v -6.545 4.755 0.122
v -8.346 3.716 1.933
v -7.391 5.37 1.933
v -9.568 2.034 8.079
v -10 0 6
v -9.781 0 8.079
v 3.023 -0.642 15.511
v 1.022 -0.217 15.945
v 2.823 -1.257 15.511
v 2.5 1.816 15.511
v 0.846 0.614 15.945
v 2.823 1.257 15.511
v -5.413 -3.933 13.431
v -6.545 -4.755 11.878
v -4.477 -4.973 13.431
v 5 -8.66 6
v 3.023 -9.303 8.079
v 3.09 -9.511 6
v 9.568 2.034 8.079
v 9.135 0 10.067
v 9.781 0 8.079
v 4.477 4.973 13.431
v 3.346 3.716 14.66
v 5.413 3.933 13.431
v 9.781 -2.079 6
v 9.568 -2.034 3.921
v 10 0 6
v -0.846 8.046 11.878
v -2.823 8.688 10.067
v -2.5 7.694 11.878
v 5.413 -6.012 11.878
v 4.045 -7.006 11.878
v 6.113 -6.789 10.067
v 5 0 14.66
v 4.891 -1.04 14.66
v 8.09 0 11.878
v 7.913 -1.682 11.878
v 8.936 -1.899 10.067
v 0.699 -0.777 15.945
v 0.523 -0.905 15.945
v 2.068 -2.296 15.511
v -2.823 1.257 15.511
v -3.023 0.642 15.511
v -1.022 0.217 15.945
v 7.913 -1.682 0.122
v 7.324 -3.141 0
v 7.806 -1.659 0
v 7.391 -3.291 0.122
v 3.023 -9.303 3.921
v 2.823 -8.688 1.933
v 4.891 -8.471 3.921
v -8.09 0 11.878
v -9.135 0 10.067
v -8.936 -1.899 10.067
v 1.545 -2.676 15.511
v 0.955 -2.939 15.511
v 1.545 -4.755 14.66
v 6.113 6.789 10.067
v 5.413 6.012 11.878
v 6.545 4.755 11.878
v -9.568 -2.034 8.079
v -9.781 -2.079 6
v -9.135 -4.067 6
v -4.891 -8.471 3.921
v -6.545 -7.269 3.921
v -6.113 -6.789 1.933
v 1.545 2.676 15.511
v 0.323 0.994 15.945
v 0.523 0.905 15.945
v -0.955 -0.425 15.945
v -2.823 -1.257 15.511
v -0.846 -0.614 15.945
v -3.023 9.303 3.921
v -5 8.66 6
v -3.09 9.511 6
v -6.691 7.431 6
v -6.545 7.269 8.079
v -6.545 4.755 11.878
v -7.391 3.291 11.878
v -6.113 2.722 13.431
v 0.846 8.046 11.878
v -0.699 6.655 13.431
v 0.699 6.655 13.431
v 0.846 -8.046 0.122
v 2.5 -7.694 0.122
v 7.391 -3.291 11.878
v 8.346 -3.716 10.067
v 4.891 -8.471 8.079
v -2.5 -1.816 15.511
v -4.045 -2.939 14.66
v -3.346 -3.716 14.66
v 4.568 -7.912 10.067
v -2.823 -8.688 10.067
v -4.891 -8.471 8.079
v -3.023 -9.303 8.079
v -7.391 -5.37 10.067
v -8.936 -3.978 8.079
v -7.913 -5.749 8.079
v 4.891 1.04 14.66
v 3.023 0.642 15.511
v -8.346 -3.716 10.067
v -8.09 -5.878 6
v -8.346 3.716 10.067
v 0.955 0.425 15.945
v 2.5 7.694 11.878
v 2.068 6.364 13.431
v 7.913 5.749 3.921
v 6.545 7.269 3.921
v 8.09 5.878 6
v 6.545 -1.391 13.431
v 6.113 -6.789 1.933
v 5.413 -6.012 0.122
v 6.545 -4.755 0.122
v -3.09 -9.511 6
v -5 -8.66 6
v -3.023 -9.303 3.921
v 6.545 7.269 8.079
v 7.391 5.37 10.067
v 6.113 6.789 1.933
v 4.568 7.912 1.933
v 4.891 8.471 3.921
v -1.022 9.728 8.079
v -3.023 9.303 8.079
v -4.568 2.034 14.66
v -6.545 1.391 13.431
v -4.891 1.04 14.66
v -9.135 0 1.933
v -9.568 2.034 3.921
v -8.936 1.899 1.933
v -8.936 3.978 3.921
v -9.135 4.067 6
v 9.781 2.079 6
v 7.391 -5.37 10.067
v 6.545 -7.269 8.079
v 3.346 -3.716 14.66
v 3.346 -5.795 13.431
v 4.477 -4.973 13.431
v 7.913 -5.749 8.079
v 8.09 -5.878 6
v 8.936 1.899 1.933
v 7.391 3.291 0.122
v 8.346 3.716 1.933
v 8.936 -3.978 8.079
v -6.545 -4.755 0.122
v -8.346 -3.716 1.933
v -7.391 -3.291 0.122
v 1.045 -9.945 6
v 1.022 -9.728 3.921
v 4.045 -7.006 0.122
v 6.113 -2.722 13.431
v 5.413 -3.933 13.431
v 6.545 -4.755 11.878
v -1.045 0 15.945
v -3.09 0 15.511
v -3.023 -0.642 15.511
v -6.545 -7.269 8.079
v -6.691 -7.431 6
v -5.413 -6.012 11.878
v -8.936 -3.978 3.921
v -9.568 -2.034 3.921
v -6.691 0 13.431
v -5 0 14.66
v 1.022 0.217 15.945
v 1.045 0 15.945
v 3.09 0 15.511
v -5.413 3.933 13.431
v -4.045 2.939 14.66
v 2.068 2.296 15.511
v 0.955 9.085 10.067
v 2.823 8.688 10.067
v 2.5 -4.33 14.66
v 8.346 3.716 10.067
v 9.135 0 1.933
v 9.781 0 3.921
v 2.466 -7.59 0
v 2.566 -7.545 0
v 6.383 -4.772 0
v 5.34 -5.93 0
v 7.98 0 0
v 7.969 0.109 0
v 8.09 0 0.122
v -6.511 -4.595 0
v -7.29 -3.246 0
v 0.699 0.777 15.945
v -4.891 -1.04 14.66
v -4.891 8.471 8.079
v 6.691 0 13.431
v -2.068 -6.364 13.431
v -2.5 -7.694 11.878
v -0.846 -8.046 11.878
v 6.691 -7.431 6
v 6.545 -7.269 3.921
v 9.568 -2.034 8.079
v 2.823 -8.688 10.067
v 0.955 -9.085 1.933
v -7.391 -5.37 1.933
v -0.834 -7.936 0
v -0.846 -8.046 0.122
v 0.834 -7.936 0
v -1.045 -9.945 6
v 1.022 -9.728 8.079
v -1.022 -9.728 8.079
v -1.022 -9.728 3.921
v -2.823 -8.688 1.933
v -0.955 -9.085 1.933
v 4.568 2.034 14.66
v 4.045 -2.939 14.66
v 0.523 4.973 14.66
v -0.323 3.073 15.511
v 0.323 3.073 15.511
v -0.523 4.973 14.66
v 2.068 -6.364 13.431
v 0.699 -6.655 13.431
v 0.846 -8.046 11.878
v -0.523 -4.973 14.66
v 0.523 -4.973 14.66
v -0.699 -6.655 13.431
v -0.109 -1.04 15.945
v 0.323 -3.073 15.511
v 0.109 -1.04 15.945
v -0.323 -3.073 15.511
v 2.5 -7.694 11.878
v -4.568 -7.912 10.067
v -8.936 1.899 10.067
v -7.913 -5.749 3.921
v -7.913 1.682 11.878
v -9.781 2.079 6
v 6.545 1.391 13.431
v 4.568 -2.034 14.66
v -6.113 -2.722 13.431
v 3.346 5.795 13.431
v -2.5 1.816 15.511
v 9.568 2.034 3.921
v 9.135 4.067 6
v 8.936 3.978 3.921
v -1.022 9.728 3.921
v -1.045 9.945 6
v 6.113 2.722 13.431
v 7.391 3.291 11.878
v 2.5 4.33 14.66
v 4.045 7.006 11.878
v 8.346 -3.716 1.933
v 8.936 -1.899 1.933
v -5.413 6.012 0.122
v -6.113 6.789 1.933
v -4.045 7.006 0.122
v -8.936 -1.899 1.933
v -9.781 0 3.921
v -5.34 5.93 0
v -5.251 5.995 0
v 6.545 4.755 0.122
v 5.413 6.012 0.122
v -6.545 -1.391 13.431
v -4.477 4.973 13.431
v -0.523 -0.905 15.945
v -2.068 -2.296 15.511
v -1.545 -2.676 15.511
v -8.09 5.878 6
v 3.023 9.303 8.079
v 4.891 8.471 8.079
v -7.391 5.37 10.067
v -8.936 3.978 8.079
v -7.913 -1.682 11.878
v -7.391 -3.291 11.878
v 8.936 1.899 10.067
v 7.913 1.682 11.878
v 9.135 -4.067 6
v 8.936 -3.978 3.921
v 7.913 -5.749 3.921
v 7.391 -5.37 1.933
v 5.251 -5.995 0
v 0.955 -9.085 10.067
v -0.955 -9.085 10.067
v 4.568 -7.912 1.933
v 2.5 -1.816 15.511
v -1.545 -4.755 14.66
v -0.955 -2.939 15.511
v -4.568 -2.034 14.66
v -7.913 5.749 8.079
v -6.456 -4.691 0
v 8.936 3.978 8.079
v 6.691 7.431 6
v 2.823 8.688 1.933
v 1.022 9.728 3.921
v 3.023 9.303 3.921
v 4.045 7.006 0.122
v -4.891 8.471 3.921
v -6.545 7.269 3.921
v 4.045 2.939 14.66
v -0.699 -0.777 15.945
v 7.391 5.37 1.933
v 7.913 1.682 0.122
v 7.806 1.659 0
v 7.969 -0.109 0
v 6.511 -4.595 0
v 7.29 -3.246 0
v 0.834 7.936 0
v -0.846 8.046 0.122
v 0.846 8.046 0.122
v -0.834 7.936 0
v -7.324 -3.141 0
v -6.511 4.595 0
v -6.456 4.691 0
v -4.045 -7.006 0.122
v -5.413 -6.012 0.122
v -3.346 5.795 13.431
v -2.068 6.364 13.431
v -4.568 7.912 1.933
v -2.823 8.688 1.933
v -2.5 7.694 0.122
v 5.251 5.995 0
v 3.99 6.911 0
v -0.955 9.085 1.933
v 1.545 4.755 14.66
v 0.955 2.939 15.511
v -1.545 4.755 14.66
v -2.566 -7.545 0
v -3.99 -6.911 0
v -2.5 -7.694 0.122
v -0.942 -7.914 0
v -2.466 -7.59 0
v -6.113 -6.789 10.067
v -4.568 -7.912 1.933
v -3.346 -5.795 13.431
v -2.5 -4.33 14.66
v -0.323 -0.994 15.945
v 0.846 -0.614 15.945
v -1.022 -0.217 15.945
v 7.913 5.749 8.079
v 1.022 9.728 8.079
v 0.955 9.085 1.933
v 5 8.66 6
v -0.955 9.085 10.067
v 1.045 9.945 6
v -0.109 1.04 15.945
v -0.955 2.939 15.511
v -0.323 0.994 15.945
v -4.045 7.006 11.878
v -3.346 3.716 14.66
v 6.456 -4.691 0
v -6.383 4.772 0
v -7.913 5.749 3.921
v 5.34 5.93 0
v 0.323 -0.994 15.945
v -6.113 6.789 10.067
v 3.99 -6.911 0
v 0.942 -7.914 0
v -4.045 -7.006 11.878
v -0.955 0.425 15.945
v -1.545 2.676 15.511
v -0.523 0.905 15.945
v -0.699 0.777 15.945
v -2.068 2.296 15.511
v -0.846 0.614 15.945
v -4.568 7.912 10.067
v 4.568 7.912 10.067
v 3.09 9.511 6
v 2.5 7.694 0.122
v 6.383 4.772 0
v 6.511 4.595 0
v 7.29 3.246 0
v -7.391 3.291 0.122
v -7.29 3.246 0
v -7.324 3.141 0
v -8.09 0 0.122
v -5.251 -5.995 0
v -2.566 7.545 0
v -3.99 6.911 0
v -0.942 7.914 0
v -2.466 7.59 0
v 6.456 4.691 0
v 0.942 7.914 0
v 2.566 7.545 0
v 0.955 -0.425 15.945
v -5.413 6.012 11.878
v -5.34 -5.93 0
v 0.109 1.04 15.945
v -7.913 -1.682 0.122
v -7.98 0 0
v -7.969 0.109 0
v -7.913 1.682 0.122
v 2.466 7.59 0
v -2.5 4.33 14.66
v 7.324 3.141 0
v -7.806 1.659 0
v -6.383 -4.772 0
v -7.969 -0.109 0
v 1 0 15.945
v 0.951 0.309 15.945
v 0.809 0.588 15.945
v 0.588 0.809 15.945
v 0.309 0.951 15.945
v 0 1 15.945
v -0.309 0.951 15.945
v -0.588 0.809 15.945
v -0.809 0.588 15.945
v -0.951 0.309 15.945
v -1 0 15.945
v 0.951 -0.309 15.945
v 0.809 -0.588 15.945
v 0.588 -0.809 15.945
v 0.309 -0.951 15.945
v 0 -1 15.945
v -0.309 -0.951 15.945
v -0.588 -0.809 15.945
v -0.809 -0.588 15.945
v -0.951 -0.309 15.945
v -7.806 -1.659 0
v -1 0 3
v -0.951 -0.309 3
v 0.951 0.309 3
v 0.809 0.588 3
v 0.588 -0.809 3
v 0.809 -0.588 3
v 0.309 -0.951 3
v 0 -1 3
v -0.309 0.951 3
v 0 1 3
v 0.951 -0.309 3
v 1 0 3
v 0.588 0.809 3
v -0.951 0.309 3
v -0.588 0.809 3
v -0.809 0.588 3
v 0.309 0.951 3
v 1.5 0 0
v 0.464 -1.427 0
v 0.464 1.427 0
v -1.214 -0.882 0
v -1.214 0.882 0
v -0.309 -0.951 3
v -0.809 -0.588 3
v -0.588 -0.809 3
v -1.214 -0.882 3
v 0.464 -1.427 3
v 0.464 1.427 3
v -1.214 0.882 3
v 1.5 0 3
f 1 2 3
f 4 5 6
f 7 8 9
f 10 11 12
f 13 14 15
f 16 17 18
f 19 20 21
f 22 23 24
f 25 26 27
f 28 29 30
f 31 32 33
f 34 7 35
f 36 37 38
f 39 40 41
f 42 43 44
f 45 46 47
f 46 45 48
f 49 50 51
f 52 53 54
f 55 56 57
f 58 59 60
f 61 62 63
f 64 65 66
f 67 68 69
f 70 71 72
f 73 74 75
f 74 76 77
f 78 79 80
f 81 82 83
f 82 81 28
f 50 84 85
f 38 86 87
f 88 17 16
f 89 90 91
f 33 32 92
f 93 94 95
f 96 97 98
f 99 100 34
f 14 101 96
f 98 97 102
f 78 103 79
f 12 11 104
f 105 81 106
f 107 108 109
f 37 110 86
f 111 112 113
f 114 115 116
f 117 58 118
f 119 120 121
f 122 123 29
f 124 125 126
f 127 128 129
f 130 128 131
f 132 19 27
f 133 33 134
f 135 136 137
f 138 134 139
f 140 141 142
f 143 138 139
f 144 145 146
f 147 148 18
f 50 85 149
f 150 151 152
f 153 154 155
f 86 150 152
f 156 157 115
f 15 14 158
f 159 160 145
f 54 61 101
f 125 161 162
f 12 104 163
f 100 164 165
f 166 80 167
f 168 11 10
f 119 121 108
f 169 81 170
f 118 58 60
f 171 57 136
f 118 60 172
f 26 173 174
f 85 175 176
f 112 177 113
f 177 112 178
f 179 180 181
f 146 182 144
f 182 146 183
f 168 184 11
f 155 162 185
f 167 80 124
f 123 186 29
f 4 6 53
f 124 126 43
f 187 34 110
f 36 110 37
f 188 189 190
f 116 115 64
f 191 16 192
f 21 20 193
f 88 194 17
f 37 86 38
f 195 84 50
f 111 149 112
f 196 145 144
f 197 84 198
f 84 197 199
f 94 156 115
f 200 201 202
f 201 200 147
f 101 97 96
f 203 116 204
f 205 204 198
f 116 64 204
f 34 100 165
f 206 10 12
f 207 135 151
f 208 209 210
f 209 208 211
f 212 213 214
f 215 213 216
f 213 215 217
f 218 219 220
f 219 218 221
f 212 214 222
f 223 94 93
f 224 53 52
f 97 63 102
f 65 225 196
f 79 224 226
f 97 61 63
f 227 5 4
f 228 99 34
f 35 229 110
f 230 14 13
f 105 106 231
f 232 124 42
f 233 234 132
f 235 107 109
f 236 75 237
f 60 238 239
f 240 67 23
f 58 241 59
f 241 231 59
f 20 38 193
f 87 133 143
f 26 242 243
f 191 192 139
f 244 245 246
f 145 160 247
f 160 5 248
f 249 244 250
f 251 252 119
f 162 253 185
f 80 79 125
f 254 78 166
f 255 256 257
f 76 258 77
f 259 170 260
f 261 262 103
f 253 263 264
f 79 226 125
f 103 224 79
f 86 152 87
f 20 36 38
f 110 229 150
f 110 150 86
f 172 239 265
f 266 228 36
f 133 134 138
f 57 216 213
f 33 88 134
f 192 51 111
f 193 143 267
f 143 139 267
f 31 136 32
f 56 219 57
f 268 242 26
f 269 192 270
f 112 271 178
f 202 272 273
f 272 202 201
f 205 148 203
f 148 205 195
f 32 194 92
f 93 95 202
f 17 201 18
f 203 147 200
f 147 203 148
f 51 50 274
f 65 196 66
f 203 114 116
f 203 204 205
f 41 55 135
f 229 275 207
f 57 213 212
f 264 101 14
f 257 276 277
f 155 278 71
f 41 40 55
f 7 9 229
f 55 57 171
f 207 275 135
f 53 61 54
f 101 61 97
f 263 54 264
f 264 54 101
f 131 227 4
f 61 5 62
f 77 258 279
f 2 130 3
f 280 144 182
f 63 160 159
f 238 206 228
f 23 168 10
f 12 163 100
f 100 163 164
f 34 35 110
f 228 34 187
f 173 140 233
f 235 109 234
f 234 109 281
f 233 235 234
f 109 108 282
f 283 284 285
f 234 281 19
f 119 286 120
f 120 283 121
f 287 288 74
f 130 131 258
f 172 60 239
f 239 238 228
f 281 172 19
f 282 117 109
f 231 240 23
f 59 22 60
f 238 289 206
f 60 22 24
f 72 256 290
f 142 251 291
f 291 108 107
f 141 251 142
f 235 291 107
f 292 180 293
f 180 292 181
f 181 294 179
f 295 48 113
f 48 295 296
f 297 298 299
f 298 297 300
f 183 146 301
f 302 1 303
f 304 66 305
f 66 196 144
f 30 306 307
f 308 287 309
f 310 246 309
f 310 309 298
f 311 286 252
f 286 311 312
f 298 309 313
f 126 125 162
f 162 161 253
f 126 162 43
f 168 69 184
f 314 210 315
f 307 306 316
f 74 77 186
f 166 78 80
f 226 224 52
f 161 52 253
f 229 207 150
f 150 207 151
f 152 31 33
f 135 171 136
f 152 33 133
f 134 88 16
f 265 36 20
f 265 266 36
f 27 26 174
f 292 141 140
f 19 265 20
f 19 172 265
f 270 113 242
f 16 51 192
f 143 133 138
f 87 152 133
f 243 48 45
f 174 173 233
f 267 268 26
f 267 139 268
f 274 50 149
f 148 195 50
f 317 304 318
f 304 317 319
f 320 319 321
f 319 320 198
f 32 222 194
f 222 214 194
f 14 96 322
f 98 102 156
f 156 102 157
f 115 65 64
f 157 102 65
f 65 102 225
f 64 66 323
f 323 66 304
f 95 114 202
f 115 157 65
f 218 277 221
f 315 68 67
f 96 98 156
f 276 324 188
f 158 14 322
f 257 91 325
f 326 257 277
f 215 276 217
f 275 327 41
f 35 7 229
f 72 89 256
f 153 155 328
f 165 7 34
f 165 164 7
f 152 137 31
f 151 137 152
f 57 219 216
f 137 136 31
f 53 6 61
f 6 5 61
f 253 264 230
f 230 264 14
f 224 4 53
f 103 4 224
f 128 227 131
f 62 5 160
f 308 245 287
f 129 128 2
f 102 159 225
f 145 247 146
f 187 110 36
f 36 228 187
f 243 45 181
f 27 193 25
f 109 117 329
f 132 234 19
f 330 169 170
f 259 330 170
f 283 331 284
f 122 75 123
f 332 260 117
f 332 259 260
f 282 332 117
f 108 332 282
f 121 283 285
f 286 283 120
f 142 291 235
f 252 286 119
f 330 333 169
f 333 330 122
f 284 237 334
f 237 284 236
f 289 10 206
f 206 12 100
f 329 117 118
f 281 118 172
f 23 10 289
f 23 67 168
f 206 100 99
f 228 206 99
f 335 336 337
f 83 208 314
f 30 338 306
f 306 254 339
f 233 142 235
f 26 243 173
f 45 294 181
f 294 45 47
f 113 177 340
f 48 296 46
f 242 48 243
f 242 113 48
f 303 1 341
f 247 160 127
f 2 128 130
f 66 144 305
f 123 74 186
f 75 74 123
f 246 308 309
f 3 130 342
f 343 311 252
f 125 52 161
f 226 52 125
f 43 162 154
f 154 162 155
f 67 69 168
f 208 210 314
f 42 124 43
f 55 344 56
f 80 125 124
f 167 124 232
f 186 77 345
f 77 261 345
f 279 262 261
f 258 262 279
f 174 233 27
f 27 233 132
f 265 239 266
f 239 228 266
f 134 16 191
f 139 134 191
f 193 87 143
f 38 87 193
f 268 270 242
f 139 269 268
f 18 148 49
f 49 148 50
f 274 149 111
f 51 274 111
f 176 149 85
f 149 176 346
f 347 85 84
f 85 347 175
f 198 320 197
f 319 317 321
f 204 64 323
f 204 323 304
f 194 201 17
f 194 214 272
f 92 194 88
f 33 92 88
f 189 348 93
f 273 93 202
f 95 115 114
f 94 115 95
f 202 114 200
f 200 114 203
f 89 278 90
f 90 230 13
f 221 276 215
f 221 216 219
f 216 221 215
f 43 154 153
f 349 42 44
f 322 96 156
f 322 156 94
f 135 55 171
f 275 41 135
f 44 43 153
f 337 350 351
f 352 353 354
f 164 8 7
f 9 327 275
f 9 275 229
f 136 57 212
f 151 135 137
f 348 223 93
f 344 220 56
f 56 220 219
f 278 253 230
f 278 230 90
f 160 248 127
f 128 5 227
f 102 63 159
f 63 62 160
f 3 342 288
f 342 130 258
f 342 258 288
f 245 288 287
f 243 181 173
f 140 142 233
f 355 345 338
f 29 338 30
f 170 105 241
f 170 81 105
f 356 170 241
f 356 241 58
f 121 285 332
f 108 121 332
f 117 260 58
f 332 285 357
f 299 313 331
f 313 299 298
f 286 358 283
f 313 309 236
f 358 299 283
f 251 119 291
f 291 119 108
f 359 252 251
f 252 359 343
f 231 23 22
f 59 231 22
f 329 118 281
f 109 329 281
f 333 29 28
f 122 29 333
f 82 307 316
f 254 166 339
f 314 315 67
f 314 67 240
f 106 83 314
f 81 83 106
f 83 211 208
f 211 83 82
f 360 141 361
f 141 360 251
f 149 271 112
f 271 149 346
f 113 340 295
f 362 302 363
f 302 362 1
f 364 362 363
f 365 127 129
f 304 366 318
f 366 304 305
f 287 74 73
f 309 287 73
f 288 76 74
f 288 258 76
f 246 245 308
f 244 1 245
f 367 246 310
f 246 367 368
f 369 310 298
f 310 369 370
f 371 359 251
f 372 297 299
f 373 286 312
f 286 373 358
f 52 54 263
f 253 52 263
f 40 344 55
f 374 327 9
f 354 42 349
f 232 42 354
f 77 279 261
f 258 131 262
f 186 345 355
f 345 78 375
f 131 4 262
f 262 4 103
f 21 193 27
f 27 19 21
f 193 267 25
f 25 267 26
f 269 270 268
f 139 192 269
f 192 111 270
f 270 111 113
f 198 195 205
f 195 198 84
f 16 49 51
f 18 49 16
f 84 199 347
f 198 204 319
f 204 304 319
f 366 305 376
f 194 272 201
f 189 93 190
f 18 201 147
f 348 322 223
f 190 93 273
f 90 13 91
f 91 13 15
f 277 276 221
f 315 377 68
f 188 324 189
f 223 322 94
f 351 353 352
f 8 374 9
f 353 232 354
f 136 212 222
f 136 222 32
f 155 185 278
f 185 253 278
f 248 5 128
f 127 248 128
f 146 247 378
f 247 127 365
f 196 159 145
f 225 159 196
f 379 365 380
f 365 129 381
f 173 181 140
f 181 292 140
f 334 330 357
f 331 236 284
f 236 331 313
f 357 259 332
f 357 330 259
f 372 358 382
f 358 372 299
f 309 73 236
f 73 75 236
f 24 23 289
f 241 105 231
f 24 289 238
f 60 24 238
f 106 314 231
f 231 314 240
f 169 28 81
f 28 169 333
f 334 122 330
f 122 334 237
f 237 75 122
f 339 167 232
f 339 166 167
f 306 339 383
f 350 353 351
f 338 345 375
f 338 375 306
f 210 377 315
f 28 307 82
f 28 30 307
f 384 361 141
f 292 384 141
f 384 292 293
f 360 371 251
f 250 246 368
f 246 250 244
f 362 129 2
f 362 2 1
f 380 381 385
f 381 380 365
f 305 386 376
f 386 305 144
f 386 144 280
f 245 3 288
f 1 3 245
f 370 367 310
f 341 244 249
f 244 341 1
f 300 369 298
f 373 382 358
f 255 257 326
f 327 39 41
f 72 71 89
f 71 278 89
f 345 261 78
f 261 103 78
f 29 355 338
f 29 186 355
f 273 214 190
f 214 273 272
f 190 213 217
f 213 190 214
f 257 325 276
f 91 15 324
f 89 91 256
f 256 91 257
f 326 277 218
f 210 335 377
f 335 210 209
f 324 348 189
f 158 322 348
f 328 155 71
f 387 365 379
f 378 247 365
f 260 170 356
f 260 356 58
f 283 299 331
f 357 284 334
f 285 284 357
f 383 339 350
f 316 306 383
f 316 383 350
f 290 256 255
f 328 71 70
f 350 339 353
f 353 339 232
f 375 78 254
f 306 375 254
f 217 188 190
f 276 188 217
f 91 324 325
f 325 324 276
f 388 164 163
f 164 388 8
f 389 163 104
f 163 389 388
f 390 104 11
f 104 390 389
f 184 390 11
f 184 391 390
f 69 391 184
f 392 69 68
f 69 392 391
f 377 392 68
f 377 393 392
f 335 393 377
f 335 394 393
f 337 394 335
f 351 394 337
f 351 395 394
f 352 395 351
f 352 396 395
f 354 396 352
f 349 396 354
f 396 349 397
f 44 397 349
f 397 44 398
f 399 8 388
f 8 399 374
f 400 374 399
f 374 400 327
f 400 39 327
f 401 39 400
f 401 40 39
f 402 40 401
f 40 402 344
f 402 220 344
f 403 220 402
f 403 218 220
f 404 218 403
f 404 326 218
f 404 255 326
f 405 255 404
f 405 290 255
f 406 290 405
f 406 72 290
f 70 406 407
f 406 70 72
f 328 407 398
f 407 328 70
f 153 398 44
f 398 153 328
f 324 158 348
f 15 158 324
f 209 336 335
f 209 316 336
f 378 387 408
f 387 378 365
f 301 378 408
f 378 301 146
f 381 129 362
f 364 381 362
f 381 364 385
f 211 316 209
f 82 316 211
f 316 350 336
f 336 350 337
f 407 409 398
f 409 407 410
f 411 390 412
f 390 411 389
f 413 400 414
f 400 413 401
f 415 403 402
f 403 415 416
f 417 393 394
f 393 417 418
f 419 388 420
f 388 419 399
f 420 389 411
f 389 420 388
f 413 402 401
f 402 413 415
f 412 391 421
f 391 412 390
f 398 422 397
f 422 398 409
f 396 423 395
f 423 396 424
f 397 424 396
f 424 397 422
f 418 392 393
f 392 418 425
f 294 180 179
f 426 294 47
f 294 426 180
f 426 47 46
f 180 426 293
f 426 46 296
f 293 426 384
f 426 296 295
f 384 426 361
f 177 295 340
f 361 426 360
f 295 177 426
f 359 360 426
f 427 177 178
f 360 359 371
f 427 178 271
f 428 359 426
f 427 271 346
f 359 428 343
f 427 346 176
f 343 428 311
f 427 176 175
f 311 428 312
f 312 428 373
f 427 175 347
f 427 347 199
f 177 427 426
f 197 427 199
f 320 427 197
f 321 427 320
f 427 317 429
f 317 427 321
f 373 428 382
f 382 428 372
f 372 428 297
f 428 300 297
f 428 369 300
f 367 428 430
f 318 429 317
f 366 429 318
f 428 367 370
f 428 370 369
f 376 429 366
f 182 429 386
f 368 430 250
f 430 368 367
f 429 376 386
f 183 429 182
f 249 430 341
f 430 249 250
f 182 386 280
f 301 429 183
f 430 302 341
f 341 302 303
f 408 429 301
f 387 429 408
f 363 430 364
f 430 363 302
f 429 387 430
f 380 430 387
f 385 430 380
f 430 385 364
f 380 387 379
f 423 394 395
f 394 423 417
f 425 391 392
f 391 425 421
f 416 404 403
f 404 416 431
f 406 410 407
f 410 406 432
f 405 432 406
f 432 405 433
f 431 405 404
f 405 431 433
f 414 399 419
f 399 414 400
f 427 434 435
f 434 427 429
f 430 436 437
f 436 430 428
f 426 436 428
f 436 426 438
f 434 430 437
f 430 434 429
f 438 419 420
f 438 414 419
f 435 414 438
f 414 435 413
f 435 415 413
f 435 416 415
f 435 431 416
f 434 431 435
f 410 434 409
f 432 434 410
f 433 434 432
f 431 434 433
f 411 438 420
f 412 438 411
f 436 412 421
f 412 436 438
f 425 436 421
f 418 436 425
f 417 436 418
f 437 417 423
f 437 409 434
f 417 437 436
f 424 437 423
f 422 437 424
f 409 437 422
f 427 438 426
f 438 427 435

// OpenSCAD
ball_dia = 20;
flat_dist = 4;
hole_dia = 2;
spotface_dia = 3;
spotface_depth = 3;

difference()
{
translate([0,0,(ball_dia/2)-flat_dist])
sphere(d=ball_dia);
    
//hole
cylinder(d=hole_dia,h=ball_dia,$fn=20);
    
//spotface
cylinder(d=spotface_dia,h=spotface_depth);
    
//cut_face
    
translate([0,0,-5])
    cube([100,100,10],center=true);
    
}
